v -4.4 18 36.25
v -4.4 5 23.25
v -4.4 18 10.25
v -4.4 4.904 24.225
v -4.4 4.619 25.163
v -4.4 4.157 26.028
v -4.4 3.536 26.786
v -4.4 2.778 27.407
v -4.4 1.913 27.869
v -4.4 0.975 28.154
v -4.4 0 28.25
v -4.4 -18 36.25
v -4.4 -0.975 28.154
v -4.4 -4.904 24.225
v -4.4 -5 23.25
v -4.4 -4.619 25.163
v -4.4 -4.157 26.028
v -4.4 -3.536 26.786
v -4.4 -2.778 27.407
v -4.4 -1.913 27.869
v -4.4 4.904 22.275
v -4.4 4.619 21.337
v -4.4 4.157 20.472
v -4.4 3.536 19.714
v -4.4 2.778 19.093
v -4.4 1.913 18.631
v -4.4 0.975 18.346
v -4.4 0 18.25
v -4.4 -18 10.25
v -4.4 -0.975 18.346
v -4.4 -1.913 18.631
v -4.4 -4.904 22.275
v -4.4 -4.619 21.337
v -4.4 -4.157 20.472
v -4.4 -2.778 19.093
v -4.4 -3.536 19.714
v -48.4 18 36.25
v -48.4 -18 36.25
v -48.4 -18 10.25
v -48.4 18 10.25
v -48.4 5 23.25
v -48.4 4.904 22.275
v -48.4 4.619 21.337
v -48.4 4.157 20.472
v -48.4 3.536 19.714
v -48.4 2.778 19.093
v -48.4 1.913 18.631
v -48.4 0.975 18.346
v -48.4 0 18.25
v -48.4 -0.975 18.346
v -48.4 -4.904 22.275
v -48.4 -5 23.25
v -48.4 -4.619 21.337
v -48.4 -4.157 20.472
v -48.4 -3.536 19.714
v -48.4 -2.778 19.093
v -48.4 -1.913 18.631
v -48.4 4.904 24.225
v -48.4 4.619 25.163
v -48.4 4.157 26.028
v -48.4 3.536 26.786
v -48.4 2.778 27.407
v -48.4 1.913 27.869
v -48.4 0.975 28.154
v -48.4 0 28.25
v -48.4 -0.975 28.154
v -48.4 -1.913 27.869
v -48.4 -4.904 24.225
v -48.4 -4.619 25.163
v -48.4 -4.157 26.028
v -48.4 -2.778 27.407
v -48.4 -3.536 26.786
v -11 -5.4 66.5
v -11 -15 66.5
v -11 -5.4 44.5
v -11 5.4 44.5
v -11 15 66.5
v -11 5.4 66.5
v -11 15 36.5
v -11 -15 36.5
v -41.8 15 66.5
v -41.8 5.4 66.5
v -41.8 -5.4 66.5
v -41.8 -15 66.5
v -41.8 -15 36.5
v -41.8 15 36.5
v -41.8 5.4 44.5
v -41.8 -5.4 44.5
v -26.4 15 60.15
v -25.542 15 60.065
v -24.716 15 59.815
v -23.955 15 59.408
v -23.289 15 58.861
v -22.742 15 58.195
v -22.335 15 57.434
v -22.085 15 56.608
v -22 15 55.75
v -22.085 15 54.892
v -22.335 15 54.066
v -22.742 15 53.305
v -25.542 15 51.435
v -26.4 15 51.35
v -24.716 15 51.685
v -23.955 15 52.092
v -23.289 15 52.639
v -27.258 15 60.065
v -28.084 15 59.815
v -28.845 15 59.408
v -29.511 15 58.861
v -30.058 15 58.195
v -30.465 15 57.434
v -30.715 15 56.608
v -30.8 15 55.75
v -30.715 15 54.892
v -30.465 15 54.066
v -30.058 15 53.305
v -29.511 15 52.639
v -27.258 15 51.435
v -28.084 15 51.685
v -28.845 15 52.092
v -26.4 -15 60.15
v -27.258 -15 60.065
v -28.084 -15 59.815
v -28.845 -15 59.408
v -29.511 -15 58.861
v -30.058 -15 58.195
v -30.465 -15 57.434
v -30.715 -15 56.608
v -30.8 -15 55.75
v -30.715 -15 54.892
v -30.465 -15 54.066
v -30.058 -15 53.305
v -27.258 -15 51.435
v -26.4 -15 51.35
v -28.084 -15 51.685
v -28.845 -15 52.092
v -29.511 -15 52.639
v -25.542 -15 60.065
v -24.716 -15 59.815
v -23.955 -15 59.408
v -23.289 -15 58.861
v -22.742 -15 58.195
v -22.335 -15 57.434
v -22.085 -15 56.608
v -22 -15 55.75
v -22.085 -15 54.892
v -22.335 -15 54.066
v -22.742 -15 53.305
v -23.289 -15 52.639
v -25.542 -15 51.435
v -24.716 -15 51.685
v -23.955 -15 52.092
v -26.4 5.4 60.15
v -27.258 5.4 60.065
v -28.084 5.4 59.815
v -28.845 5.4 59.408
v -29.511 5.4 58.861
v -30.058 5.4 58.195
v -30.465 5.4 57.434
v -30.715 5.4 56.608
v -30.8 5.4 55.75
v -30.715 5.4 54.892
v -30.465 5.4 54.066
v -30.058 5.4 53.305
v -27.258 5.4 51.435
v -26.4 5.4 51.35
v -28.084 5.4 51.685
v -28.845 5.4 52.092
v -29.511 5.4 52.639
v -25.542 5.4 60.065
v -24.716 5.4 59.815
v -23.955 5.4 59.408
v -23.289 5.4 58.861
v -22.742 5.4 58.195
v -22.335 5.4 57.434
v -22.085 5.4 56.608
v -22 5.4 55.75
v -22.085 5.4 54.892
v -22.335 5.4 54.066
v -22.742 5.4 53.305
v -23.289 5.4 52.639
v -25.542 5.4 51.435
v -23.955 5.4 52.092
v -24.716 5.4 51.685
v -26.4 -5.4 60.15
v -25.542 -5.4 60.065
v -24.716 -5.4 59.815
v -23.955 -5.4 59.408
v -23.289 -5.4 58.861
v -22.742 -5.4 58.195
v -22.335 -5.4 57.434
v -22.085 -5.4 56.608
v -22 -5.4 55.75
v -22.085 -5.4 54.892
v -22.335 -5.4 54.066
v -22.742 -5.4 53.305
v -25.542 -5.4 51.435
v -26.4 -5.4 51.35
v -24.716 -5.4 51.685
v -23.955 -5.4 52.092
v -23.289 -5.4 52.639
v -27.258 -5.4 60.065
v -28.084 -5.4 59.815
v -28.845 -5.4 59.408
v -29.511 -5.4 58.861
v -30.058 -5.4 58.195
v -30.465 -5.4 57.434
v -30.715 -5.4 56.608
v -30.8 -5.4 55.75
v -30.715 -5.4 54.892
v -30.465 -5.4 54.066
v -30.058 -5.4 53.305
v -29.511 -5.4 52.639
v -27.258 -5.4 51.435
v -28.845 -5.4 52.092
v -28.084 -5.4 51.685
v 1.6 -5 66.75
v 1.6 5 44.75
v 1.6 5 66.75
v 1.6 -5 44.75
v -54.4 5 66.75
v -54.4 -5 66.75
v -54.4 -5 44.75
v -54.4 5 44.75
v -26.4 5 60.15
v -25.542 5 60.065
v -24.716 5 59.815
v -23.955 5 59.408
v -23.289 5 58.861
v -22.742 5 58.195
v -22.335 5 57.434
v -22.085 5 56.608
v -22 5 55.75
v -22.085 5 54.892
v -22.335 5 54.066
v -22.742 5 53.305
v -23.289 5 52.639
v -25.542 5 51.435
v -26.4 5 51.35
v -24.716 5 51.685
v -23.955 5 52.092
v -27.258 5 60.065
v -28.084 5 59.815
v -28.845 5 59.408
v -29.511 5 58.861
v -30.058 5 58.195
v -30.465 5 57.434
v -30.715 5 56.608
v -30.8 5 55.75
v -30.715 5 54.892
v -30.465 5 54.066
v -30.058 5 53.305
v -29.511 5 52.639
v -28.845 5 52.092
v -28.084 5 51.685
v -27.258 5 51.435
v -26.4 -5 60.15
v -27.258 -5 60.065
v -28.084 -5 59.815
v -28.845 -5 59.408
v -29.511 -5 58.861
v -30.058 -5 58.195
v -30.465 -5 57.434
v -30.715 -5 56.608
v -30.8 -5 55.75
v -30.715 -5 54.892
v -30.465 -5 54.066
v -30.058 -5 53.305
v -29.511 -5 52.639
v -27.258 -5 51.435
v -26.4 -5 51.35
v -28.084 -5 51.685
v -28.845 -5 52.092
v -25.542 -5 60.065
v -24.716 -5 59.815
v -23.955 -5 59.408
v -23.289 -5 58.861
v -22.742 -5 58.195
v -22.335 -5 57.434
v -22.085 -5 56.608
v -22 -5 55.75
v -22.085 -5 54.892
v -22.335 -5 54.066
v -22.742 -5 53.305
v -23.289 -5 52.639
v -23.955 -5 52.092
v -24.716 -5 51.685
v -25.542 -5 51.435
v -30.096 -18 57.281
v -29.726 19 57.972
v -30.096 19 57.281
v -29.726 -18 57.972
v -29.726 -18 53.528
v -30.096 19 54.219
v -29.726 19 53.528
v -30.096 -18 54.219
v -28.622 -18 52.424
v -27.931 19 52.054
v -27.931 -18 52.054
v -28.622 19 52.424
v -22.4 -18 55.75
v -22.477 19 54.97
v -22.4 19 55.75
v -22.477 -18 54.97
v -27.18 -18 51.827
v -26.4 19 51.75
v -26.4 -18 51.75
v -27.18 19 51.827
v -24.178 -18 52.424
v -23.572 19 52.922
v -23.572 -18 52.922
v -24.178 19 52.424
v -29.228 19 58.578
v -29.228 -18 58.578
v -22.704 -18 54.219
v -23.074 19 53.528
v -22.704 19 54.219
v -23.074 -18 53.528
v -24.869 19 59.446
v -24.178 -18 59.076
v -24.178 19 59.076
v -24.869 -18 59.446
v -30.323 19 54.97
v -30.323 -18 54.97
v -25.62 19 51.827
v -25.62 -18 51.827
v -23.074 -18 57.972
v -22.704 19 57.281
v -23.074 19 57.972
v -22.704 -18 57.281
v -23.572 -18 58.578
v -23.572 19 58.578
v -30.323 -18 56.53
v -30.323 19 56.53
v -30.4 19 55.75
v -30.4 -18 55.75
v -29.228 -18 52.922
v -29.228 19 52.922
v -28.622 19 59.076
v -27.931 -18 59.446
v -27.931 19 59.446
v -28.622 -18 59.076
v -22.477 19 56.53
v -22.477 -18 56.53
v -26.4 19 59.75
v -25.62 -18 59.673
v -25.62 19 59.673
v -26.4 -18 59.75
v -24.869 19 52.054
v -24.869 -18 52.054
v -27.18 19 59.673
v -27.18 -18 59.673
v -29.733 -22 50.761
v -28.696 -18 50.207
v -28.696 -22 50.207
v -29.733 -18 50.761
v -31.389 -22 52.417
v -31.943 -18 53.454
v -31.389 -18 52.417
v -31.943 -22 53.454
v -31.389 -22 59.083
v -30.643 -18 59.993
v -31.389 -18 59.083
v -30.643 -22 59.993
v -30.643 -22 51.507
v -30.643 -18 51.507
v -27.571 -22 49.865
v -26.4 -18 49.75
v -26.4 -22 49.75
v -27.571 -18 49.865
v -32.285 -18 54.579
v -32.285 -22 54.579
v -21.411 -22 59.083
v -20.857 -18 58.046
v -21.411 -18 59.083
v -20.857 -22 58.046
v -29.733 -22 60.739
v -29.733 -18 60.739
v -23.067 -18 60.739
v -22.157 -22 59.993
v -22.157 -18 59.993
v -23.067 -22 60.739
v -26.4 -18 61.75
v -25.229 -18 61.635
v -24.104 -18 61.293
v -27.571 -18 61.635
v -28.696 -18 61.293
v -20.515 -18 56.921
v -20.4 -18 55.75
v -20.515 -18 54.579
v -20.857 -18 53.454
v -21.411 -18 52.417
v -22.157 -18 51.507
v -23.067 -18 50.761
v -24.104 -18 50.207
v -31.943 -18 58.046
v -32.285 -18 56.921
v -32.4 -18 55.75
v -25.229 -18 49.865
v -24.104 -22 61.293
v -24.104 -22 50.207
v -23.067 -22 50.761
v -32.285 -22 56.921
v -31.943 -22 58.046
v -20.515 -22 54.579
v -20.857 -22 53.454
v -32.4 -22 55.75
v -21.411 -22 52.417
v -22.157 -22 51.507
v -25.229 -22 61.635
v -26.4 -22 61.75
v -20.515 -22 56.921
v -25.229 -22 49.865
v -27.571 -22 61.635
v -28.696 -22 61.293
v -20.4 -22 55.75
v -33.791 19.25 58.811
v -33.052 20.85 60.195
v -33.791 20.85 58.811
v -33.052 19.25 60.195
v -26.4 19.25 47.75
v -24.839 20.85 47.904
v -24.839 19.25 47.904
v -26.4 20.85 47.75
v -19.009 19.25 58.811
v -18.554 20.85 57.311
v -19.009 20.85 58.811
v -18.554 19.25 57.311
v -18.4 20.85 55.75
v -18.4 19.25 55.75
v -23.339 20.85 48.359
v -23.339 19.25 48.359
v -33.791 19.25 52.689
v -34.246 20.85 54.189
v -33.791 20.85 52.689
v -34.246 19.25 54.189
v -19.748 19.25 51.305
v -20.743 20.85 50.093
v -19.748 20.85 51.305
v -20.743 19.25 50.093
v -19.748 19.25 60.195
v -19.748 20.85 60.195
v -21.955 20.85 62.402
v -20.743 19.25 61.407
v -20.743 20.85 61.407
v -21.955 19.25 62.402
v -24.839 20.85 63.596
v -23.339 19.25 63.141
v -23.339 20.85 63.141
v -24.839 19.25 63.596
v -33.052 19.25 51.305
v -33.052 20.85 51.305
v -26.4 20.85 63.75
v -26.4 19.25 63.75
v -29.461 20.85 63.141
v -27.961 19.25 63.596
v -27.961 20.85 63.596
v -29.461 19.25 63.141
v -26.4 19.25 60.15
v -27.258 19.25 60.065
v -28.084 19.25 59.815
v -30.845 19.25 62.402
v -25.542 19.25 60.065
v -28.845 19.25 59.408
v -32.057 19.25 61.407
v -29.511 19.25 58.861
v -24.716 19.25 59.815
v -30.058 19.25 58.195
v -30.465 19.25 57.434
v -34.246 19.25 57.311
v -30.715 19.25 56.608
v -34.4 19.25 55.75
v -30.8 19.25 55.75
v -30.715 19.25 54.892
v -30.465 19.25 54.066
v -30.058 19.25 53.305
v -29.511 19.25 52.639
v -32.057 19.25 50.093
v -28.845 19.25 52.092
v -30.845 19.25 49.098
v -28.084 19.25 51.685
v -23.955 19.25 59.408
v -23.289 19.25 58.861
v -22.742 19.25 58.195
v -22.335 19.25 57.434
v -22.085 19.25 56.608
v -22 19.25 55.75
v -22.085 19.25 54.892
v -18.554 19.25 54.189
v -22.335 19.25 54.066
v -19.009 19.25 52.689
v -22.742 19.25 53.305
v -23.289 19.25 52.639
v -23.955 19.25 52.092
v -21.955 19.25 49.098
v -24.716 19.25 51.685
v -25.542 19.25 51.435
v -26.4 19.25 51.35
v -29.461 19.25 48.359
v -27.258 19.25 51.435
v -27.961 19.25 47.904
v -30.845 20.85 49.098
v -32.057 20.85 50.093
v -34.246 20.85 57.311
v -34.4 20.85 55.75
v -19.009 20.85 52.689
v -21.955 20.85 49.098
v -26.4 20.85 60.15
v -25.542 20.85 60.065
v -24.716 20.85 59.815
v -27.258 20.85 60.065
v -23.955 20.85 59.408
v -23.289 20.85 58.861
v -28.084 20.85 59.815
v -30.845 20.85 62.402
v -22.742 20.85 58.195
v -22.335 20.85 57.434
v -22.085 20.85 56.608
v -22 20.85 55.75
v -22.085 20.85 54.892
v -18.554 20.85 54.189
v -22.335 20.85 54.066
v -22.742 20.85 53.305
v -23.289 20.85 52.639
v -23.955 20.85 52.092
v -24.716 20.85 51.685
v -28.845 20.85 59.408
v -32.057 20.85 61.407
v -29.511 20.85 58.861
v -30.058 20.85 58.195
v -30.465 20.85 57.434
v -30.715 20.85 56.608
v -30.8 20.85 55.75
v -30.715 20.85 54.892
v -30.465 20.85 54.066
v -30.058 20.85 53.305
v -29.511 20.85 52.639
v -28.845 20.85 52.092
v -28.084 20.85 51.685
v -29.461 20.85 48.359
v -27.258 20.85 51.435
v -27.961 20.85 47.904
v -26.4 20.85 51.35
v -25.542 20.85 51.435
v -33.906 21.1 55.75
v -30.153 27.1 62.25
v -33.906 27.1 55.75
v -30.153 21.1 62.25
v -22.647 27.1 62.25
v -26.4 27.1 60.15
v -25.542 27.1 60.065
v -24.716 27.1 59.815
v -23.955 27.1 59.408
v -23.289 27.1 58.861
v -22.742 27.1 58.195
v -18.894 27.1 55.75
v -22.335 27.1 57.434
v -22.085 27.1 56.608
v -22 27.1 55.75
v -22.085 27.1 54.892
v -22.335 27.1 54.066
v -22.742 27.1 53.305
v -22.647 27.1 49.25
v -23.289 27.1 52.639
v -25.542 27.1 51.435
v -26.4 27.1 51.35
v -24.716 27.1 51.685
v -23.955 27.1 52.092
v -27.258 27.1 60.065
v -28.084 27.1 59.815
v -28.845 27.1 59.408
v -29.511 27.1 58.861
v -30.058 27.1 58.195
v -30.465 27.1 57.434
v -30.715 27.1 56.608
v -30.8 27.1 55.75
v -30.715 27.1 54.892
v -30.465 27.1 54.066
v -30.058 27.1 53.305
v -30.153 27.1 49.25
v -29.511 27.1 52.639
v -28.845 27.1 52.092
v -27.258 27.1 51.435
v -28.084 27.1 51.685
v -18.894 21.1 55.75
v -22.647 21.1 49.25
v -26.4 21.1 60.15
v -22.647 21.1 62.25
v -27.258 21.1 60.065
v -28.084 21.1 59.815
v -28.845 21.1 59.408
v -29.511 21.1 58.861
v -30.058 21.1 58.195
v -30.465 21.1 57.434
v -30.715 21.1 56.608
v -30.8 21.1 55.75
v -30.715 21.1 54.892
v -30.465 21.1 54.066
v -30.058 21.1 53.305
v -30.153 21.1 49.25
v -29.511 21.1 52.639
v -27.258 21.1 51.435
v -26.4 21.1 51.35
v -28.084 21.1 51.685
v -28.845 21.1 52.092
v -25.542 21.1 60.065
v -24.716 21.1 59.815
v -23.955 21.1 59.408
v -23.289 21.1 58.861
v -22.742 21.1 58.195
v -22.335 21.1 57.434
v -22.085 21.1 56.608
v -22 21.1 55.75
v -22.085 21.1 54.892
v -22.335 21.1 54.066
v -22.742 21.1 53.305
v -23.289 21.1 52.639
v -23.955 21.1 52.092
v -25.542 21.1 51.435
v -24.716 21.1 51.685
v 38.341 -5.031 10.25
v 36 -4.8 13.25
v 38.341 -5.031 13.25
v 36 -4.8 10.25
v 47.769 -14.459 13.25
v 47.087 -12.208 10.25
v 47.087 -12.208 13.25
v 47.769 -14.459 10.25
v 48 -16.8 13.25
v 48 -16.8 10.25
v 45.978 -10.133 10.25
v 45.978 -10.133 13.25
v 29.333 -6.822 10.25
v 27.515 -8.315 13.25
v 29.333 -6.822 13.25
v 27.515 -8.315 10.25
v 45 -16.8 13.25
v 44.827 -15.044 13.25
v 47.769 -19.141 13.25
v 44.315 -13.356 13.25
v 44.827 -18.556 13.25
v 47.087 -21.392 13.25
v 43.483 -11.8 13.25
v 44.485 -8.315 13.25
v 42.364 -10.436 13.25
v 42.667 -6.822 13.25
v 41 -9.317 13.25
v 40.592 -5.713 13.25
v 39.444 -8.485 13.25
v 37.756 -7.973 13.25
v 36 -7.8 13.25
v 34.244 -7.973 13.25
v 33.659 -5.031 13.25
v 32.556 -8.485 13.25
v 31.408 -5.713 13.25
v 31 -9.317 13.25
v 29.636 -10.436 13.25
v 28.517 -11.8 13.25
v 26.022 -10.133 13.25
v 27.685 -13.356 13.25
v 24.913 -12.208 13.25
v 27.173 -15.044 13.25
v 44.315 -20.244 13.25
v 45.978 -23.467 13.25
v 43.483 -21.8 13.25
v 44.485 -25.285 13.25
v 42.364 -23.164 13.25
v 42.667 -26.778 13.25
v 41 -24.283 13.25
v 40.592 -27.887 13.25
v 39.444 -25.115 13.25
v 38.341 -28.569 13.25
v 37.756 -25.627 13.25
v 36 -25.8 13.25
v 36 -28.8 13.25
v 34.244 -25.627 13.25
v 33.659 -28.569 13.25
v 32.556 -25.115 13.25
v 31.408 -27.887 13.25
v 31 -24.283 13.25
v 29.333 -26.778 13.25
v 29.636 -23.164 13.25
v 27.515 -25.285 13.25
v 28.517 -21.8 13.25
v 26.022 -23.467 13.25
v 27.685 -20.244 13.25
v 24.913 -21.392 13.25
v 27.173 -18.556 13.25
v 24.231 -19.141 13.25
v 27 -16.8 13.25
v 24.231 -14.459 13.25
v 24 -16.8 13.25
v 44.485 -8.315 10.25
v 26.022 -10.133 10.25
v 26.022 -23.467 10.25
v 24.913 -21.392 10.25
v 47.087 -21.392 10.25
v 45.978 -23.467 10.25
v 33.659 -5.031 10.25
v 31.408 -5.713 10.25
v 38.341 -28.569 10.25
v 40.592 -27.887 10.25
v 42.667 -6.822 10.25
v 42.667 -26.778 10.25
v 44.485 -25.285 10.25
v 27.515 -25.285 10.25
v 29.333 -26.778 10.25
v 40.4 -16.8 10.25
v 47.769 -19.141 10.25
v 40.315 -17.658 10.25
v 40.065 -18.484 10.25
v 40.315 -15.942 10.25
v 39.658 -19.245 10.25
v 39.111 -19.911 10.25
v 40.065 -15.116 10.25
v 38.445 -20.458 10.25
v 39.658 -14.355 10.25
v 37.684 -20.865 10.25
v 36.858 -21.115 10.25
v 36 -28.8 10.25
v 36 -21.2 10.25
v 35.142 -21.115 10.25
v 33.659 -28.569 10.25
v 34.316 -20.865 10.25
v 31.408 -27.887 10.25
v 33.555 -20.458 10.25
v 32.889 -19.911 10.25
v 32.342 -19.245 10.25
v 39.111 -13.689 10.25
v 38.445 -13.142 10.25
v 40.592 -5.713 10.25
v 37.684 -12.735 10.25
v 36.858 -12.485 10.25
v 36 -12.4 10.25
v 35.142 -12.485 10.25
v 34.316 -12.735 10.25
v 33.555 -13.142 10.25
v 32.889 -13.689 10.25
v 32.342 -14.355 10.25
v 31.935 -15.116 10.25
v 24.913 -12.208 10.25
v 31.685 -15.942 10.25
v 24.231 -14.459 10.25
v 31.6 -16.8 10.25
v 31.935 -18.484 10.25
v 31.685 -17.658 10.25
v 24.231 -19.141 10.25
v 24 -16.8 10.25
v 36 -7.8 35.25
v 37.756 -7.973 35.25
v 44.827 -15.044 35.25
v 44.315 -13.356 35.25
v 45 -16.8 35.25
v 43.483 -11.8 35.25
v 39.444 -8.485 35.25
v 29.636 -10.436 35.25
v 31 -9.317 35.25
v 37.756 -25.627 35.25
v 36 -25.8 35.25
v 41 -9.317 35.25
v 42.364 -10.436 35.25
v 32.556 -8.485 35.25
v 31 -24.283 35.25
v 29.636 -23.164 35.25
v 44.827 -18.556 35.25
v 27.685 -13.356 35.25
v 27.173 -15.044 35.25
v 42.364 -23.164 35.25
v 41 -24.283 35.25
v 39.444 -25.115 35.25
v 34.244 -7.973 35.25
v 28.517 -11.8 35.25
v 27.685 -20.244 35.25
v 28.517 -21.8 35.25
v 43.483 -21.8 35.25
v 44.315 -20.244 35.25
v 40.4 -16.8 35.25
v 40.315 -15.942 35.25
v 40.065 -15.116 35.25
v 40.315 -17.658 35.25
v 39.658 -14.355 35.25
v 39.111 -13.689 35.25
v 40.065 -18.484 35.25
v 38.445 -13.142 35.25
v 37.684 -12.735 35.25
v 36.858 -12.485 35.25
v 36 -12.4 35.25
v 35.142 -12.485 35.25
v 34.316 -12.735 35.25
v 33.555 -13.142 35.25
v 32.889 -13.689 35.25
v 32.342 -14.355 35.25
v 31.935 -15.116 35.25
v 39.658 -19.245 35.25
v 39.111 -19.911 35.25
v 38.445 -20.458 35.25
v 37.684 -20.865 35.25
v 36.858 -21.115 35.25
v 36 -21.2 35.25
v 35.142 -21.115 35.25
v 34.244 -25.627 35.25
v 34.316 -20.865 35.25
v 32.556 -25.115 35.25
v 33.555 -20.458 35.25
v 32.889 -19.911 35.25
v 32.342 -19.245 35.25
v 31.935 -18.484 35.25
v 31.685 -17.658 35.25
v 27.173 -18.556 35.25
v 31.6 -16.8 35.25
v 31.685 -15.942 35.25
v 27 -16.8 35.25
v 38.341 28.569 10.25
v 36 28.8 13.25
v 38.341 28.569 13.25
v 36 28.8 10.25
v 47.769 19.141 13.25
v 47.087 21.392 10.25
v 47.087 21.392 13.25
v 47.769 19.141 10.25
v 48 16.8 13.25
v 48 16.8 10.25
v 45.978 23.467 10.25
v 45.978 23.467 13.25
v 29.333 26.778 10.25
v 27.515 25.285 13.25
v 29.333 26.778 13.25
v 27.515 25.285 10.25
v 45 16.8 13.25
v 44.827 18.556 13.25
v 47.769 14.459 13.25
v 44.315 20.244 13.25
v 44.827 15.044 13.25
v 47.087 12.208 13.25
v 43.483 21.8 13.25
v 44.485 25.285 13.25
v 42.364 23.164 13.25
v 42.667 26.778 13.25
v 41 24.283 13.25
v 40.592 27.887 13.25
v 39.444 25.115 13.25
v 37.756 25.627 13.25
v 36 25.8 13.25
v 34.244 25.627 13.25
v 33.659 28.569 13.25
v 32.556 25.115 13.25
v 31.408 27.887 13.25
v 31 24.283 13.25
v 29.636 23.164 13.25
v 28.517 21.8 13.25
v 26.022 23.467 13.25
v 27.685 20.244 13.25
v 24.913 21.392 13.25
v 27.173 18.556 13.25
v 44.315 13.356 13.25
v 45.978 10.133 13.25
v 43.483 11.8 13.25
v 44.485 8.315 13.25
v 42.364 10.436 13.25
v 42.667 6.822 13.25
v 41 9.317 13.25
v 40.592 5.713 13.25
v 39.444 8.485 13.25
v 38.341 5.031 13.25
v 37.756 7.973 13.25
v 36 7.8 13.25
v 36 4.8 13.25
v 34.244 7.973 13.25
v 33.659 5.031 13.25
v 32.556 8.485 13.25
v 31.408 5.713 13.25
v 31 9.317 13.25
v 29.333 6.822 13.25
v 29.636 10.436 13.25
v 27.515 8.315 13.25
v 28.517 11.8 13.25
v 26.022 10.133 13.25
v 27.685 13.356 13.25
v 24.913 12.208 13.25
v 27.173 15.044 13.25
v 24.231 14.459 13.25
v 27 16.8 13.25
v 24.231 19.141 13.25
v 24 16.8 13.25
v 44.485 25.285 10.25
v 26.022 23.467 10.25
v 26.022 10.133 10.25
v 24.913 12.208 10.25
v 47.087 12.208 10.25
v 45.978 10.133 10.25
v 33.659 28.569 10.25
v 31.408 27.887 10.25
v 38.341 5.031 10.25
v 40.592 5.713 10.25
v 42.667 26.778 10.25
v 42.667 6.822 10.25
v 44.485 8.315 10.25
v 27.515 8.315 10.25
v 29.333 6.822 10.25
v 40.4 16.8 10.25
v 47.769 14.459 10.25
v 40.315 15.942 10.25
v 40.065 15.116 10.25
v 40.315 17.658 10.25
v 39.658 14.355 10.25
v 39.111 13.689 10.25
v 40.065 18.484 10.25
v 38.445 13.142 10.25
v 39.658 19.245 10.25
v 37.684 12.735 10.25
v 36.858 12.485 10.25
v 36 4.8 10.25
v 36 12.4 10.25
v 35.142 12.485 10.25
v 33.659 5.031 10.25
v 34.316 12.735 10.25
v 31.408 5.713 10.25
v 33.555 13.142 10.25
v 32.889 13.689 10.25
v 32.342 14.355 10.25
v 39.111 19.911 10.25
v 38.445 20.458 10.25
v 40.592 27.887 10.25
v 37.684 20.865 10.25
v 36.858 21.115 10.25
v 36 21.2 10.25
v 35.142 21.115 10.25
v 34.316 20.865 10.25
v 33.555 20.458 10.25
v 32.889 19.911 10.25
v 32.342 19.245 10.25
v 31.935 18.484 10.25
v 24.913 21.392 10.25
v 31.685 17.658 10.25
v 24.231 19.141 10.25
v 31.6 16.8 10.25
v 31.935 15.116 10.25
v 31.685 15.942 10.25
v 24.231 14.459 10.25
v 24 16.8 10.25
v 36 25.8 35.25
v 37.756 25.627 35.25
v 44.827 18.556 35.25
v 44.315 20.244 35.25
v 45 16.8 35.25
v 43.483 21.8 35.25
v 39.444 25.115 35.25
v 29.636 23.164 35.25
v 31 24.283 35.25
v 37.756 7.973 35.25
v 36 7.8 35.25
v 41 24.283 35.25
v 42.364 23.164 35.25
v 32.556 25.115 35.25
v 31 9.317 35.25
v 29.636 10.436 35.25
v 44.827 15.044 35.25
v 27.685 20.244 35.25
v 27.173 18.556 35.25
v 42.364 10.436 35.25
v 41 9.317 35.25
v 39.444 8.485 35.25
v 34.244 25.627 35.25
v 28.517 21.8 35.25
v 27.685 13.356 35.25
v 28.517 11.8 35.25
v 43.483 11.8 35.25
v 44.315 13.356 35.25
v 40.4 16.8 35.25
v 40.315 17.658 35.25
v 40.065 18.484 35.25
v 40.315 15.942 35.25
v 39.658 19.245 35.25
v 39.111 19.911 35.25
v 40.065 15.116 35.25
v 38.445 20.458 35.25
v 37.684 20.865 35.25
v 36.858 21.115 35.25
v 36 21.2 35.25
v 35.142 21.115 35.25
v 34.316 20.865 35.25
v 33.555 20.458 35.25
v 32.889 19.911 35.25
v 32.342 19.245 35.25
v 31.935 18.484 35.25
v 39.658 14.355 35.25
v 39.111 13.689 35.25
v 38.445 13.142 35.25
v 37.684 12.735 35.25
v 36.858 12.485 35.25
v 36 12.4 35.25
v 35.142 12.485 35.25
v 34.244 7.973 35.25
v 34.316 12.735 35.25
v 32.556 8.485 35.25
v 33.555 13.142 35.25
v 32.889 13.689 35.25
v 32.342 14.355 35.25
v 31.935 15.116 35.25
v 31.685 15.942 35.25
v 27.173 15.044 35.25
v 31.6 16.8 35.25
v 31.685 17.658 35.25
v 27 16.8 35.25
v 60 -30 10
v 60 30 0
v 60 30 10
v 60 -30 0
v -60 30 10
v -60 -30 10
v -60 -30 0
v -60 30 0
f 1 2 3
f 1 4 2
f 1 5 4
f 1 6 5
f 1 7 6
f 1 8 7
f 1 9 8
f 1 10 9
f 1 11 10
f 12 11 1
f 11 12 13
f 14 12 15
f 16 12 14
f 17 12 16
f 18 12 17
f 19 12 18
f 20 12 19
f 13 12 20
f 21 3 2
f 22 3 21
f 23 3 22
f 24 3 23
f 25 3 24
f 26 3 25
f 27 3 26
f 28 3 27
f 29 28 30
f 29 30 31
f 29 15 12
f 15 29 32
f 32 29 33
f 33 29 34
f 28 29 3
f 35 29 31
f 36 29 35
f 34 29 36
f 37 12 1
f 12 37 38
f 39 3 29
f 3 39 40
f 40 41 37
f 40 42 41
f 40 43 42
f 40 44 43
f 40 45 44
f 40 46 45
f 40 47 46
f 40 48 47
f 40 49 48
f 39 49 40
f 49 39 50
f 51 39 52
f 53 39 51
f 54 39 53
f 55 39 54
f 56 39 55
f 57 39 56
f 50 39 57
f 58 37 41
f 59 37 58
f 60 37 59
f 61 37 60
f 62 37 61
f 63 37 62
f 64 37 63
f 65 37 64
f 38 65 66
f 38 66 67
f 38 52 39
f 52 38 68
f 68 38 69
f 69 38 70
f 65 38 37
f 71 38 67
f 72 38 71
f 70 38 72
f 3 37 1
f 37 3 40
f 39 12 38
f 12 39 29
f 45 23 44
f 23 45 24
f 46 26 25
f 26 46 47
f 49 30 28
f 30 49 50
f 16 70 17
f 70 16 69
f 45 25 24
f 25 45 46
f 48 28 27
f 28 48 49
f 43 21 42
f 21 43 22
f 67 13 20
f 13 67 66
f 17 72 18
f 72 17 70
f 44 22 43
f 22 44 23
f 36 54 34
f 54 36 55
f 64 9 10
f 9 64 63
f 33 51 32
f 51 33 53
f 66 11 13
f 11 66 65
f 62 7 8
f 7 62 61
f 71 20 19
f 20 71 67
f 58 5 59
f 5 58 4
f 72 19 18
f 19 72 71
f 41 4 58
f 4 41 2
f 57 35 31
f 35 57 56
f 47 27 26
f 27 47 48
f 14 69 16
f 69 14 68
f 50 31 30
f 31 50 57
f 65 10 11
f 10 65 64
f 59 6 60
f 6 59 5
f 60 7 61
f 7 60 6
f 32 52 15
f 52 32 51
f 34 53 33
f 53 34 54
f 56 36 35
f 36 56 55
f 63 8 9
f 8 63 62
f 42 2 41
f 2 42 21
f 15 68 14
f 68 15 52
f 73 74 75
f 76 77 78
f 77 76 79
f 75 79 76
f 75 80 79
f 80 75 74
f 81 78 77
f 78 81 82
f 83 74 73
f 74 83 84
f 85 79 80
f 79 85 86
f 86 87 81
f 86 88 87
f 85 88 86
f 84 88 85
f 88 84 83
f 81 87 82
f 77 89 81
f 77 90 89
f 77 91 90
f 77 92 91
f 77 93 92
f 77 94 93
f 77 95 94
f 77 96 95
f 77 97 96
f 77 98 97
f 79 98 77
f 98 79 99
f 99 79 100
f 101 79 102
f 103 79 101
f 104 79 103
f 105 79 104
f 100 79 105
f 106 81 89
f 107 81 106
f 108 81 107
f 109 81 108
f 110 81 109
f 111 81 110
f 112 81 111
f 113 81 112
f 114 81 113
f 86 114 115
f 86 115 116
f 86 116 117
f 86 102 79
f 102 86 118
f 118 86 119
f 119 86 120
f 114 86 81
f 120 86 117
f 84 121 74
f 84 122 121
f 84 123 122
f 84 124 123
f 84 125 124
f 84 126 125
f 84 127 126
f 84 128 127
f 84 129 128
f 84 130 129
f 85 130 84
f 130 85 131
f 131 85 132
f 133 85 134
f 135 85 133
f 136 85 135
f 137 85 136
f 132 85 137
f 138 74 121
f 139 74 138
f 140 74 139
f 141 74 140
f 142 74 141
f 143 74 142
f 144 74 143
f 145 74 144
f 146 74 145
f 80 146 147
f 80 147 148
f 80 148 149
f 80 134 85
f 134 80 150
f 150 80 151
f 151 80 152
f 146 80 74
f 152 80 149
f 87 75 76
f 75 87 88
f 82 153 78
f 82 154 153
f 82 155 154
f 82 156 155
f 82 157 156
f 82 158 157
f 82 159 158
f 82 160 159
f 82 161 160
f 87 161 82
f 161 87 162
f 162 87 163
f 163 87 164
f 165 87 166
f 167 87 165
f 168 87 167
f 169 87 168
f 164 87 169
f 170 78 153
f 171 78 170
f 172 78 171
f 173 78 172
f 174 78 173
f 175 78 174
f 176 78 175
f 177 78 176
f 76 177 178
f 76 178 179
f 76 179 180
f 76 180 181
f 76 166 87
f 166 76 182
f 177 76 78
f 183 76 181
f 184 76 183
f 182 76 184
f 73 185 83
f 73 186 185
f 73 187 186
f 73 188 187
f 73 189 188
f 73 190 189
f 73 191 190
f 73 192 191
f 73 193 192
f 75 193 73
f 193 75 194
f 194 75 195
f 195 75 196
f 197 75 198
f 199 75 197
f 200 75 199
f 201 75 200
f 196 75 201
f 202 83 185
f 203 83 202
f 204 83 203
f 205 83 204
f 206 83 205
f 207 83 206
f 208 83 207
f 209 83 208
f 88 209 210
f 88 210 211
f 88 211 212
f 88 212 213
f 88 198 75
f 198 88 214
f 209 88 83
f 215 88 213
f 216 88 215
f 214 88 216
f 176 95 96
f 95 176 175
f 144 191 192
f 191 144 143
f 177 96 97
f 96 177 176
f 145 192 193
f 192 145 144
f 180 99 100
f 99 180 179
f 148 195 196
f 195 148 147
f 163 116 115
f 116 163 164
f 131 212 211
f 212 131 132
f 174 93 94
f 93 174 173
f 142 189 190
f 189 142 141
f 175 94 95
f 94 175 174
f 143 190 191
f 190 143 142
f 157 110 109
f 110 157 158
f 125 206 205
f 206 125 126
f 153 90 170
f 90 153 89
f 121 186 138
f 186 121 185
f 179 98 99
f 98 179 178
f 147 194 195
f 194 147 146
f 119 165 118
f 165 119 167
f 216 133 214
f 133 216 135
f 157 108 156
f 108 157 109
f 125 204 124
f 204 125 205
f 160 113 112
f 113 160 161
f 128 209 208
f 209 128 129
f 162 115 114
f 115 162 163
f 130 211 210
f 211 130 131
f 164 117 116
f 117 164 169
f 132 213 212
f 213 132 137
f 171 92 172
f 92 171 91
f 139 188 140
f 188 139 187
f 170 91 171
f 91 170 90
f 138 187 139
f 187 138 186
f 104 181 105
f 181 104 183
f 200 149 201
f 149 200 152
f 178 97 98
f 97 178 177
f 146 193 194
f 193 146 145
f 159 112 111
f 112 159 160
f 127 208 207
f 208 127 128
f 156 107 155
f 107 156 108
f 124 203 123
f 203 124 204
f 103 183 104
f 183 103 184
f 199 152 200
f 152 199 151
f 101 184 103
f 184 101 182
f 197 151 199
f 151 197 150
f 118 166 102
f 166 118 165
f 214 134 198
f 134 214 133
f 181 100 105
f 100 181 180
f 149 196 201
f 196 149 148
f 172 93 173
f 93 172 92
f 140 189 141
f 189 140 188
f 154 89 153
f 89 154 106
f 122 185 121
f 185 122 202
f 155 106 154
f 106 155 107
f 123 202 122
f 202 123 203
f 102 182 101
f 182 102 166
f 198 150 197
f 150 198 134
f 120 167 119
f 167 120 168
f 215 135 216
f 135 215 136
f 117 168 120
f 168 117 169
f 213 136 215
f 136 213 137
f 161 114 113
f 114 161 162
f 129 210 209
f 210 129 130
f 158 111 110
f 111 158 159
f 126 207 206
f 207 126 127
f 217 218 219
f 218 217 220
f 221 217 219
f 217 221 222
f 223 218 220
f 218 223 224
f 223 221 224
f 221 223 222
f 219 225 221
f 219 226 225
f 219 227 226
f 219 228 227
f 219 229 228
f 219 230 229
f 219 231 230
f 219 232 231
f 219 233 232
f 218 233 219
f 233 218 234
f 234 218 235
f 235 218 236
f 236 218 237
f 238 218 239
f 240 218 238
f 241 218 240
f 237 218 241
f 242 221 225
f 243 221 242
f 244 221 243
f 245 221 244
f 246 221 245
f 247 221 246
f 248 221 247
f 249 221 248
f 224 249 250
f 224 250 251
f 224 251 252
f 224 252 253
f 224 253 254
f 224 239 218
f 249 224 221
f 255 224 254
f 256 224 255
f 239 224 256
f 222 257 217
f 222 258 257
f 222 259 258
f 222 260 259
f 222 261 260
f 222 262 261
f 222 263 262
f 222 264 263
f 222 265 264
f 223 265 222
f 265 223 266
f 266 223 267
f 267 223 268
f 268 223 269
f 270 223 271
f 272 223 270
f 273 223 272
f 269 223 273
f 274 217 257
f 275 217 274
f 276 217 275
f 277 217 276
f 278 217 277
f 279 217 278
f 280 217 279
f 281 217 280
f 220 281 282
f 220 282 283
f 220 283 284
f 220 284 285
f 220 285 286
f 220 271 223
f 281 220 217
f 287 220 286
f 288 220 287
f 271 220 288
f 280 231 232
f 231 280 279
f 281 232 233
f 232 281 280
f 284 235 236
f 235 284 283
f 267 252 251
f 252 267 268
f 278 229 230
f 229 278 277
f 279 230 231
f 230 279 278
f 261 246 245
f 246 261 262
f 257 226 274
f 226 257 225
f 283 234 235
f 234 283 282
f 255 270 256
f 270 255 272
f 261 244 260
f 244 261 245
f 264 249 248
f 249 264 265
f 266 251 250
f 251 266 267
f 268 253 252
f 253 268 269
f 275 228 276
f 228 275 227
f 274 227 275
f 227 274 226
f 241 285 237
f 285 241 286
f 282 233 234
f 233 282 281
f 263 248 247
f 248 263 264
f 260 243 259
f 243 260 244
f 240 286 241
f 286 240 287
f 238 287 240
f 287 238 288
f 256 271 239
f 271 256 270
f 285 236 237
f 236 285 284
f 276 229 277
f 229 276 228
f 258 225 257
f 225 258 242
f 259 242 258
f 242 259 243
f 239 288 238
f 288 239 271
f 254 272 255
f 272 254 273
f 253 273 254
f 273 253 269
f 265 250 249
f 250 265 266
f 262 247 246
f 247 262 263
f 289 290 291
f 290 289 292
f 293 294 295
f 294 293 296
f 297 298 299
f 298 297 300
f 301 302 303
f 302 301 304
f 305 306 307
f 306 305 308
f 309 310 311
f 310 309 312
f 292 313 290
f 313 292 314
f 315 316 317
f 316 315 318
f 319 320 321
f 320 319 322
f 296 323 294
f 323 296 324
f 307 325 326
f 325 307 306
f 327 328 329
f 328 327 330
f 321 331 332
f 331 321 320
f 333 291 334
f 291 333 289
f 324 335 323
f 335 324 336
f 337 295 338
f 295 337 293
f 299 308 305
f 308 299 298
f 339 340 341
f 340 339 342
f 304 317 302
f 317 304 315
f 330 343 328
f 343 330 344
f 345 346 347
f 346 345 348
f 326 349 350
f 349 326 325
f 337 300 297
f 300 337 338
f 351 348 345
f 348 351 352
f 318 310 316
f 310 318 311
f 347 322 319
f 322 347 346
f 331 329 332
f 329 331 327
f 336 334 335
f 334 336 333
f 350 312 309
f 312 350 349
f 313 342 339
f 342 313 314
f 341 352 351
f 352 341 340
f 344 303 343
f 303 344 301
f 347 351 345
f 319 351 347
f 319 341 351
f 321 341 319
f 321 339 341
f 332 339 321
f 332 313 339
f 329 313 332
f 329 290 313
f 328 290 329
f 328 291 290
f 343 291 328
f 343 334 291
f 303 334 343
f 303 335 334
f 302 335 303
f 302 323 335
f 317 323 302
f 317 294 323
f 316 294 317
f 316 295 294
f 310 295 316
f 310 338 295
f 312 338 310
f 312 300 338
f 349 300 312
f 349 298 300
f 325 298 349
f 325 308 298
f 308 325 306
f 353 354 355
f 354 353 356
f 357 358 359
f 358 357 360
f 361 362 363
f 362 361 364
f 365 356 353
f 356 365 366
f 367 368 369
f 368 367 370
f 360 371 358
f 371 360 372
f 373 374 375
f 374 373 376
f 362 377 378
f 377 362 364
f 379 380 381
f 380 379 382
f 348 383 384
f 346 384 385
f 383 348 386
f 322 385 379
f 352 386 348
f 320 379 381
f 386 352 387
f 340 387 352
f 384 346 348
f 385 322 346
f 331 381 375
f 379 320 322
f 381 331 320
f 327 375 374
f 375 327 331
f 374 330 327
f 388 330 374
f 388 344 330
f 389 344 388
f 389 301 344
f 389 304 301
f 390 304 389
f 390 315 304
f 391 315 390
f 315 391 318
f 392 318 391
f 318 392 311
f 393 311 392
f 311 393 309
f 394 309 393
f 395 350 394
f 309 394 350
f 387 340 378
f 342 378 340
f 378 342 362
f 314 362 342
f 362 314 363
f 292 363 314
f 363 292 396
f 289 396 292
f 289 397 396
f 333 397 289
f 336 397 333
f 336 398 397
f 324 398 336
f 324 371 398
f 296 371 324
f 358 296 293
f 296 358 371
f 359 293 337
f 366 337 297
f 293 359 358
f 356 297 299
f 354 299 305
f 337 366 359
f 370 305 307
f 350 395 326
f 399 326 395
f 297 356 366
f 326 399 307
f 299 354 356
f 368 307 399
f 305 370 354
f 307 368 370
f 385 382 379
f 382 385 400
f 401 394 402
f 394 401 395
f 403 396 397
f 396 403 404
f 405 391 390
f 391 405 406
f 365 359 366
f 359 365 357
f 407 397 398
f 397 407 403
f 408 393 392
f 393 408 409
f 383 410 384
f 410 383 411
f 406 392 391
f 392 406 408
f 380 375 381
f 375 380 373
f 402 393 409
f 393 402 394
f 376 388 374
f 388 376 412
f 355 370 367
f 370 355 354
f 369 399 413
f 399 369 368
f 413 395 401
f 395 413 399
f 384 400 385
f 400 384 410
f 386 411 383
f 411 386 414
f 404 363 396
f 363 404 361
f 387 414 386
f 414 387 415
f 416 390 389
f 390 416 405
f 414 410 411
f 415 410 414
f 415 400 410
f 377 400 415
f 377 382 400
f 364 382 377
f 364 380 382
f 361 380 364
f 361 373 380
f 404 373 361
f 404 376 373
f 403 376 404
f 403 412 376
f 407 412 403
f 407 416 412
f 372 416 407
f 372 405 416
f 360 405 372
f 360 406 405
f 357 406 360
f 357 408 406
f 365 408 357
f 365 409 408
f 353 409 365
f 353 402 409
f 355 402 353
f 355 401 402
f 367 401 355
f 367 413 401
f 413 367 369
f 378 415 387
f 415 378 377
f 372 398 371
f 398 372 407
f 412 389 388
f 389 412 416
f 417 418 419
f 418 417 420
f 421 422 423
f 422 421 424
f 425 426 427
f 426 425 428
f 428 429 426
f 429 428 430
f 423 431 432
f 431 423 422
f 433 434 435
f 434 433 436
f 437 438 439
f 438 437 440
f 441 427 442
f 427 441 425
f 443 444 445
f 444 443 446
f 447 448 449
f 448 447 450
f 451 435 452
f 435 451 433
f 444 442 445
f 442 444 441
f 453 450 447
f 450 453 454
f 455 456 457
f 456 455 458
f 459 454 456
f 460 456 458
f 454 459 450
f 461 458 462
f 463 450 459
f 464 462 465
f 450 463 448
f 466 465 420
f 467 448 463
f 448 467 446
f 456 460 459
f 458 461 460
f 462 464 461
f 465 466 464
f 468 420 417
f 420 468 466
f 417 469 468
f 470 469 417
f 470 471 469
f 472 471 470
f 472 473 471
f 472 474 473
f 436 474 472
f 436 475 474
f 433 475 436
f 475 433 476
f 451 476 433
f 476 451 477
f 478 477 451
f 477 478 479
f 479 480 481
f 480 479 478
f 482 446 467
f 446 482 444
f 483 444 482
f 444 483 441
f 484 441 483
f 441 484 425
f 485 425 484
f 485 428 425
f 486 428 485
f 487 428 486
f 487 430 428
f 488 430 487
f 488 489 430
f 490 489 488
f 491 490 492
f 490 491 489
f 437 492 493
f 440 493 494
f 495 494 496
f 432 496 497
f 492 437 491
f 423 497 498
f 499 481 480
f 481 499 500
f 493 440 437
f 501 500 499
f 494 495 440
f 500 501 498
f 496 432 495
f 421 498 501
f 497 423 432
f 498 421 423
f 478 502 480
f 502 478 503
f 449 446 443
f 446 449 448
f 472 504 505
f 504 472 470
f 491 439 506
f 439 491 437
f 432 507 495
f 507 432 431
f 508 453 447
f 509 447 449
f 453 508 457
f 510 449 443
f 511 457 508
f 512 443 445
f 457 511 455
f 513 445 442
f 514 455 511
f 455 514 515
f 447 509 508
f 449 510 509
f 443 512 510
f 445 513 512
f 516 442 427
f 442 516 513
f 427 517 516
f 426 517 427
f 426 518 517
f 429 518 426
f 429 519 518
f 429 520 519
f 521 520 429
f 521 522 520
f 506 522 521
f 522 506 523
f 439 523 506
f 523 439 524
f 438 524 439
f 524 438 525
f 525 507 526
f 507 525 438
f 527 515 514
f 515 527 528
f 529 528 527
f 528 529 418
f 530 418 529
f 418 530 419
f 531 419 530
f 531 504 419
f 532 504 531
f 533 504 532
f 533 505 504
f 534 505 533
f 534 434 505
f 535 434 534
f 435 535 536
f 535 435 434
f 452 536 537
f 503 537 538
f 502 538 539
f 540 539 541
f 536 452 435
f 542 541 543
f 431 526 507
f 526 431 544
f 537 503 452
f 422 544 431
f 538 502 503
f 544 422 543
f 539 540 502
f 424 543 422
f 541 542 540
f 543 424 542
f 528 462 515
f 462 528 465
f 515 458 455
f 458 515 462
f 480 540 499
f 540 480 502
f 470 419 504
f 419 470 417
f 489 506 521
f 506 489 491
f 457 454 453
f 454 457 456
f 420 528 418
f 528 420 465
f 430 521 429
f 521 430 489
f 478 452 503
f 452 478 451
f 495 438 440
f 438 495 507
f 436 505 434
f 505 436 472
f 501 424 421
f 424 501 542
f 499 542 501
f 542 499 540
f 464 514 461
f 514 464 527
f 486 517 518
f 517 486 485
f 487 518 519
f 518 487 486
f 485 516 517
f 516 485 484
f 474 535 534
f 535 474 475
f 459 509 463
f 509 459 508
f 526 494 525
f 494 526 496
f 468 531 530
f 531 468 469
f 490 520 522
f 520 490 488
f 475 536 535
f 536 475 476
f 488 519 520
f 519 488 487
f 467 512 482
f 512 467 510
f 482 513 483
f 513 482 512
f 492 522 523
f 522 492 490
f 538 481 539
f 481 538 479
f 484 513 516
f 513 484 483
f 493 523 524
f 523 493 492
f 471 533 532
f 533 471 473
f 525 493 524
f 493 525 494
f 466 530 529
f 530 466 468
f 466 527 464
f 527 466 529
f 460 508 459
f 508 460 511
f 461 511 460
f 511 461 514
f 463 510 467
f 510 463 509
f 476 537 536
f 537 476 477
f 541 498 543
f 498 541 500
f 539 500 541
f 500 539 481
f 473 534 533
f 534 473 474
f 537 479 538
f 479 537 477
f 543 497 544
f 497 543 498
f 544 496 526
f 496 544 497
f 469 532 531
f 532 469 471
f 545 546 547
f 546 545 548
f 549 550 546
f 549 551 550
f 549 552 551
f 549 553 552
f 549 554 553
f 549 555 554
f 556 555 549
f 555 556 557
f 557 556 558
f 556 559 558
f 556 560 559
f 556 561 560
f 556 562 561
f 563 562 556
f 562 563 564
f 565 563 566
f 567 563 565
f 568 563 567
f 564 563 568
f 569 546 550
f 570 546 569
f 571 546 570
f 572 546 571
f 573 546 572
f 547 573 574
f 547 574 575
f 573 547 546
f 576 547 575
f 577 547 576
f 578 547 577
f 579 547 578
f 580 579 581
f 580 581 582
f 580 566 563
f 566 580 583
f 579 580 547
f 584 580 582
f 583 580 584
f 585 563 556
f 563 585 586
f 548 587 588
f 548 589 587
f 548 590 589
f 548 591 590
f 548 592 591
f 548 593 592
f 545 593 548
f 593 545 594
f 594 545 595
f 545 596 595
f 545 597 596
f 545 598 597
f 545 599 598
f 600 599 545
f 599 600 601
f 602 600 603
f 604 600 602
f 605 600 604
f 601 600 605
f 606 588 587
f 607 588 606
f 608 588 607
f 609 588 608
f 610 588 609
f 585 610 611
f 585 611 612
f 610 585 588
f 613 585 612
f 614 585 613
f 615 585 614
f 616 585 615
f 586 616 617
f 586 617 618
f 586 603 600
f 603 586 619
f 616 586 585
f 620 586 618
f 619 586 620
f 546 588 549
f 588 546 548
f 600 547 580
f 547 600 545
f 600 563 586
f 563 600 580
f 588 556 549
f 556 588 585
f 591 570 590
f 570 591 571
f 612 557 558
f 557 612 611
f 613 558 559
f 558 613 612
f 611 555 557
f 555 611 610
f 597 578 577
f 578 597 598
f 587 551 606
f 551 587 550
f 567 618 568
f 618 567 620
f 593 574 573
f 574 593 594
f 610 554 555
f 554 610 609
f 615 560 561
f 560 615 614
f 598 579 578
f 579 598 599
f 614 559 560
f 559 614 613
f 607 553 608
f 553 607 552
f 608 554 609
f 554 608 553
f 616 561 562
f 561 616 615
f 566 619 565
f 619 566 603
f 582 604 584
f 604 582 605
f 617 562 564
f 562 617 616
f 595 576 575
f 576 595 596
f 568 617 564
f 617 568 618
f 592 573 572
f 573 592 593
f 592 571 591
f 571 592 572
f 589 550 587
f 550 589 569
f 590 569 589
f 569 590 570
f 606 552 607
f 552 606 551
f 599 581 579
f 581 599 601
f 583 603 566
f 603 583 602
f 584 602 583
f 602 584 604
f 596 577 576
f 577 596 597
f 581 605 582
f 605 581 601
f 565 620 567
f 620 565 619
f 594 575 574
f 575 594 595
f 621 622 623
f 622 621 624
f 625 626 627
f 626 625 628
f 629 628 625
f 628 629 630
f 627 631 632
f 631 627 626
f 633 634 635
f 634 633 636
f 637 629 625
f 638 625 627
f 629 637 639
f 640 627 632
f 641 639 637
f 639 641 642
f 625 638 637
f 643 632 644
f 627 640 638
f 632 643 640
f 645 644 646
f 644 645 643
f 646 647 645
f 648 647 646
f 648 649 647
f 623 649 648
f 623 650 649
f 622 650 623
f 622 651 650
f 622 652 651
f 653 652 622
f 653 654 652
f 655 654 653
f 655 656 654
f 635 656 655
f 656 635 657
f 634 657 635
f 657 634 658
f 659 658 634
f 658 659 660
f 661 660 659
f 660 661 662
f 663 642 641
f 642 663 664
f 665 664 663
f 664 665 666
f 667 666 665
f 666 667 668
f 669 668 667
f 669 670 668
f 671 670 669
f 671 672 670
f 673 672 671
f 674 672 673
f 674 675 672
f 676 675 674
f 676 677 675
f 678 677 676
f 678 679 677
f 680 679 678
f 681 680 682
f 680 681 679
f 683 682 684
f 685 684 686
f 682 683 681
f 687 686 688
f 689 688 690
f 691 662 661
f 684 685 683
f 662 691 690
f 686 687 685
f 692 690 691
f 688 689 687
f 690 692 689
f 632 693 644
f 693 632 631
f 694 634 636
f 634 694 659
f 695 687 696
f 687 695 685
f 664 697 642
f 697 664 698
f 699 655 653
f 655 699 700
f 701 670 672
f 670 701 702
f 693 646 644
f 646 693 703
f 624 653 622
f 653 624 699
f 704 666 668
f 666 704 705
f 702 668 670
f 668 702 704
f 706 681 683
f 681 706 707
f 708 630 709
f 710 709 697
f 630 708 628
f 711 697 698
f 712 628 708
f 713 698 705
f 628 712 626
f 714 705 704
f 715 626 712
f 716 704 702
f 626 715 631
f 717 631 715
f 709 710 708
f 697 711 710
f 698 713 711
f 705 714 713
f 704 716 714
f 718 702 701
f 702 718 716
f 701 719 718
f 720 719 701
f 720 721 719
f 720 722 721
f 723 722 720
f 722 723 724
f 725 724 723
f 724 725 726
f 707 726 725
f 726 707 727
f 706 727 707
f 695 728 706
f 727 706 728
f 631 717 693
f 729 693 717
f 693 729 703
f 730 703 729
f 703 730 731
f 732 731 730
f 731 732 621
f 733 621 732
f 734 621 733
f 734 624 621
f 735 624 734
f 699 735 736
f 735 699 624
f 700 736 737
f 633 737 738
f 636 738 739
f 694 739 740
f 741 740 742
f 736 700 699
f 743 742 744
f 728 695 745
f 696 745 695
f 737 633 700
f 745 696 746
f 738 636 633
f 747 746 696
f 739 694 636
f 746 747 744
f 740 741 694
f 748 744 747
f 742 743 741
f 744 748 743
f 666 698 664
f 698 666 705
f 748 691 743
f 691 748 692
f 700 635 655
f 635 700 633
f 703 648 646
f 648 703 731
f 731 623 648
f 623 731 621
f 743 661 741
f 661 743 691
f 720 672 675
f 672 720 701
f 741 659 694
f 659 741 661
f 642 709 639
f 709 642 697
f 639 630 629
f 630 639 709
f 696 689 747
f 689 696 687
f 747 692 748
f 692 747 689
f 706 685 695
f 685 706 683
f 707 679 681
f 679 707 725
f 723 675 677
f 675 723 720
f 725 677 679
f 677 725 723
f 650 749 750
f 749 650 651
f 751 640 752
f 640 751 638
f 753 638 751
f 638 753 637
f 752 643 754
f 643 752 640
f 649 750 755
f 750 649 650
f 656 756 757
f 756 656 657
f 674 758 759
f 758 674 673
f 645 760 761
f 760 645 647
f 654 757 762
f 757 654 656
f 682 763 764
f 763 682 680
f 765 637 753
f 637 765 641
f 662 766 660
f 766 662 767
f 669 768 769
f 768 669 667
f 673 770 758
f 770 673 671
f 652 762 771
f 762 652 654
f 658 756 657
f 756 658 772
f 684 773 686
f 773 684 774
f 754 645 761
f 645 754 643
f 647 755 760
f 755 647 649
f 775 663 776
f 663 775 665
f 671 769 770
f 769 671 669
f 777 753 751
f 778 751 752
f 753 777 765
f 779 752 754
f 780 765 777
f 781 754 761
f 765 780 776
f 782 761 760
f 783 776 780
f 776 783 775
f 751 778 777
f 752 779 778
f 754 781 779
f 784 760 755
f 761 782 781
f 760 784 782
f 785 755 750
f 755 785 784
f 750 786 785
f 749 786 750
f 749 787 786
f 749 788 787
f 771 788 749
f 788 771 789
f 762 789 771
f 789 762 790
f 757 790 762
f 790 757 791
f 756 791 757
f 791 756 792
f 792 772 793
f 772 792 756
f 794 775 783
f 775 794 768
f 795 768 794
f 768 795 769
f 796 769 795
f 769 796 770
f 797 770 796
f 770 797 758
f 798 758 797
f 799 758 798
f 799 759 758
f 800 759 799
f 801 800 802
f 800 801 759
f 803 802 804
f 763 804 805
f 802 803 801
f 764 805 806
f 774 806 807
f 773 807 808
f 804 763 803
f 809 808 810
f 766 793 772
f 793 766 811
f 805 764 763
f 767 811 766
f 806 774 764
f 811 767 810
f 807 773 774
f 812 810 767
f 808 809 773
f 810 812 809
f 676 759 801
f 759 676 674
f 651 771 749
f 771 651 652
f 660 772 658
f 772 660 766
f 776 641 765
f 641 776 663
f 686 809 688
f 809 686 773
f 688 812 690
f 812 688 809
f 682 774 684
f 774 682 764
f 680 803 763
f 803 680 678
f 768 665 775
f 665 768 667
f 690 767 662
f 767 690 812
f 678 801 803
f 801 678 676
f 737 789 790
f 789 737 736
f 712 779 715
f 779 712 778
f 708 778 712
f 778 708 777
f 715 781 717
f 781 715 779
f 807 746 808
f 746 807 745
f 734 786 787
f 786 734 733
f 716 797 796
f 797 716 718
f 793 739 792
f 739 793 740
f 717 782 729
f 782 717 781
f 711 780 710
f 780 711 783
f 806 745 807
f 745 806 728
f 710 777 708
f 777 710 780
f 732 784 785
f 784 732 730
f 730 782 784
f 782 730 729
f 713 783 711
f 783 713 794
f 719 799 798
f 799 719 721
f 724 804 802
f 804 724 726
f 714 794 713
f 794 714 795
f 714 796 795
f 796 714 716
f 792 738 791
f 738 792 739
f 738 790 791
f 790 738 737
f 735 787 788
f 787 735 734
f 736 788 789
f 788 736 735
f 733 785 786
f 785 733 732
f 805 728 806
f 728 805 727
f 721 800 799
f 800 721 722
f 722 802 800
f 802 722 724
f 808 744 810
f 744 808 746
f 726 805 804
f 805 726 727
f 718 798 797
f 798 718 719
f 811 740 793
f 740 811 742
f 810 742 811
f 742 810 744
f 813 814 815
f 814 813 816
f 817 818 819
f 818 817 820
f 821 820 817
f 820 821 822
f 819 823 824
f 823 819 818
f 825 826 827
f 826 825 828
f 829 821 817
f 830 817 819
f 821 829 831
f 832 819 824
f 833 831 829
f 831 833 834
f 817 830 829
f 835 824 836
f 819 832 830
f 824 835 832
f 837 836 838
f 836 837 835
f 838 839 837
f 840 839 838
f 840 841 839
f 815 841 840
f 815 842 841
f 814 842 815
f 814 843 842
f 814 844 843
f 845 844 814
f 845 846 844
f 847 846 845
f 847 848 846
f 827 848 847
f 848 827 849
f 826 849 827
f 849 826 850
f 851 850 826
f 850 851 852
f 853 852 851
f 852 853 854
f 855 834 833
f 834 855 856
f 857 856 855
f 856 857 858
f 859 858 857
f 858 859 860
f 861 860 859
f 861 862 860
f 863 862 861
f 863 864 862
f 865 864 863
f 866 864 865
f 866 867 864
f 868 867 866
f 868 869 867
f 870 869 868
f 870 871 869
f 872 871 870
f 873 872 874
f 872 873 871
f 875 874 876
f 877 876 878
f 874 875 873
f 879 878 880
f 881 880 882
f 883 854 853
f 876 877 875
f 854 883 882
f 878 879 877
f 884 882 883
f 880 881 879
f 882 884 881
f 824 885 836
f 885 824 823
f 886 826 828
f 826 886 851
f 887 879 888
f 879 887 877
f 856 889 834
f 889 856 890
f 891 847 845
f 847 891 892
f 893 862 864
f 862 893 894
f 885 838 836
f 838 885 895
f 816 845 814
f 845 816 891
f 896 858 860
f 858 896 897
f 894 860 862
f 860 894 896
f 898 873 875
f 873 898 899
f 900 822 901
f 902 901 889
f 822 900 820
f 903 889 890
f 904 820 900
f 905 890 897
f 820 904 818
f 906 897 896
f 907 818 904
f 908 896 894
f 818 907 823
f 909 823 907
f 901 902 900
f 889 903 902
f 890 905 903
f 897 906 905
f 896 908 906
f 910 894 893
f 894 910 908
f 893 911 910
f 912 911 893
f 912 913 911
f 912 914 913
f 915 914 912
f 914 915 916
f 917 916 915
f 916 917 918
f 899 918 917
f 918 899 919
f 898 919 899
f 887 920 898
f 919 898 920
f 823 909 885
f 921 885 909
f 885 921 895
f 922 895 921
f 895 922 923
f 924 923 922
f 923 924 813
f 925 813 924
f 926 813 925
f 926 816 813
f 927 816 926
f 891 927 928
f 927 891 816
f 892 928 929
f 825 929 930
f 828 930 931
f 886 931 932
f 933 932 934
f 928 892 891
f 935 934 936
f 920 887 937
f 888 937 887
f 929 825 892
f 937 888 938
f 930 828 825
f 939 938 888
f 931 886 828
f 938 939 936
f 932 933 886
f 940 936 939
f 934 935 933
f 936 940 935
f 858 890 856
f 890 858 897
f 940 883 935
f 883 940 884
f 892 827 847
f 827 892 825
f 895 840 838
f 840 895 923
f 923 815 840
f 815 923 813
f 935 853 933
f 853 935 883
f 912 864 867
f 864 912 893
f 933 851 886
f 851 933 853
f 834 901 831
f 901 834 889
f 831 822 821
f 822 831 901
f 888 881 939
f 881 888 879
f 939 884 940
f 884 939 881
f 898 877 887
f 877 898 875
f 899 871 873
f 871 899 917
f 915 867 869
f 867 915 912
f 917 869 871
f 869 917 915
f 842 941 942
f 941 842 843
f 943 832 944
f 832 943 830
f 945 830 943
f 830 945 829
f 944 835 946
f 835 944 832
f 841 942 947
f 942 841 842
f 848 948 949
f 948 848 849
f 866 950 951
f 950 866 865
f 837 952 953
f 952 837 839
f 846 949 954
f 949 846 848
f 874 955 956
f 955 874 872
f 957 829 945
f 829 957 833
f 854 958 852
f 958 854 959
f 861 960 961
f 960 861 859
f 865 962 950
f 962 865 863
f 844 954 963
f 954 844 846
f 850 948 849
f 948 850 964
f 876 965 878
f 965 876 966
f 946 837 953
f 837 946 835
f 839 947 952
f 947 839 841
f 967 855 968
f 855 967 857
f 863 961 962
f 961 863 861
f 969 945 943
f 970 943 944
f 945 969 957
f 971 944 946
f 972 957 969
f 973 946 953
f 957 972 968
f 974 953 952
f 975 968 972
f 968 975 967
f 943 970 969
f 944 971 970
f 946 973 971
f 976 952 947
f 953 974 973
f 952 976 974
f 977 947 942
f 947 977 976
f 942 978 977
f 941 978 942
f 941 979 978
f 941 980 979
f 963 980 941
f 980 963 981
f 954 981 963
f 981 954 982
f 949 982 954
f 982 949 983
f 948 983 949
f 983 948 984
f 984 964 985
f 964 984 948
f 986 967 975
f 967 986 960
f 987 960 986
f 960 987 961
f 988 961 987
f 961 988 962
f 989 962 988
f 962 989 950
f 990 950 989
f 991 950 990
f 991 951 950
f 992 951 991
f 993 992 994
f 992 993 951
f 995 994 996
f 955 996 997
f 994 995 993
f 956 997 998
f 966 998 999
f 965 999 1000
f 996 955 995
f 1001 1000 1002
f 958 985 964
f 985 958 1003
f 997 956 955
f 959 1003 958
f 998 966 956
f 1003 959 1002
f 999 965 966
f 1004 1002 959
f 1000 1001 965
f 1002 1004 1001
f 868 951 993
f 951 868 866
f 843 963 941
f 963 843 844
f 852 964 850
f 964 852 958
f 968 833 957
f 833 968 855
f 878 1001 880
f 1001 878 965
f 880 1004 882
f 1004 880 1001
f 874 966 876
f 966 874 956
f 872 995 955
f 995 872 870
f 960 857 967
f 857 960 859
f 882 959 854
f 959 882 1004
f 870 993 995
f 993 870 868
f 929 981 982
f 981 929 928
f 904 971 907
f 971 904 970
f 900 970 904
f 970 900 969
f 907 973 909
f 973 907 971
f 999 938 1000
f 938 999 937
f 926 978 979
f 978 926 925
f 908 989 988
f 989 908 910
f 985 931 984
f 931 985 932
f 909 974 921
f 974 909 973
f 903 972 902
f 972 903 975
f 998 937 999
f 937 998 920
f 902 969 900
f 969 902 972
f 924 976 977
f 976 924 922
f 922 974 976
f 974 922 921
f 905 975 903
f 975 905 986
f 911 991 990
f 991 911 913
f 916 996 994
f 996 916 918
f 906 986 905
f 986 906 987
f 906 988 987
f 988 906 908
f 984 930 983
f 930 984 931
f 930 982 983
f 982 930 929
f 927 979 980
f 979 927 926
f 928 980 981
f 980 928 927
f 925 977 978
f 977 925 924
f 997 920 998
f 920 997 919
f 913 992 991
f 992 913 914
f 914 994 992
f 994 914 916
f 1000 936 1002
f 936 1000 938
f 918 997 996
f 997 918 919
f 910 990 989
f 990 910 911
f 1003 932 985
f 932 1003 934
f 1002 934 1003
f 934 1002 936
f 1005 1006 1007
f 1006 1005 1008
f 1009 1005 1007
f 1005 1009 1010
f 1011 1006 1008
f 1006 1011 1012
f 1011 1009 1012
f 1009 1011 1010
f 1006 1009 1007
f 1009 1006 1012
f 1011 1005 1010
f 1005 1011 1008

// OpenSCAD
$fn = 32;

// ------------------------------------------------------------------------
// Indexing jig: plate 120 x 60 mm, pin d8
// Every part is its own module, assembly() places every instance.
// ------------------------------------------------------------------------

// --- part 1 ---
module jig_plate() {
  difference() {
    translate([-60, -30, 0]) cube([120, 60, 10]);
  }
}

// --- part 2 ---
module locator_block() {
  difference() {
    translate([-22, -18, 0]) cube([44, 36, 26]);
    translate([0, 0, 13]) rotate([0, 90, 0]) cylinder(h = 46, d = 10, center = true);
  }
}

// --- part 3 ---
module index_fork() {
  difference() {
    translate([-15.4, -15, 0]) cube([30.8, 30, 30]);
    translate([-16.4, -5.4, 8]) cube([32.8, 10.8, 23]);
    translate([0, 0, 19.25]) rotate([90, 0, 0]) cylinder(h = 32, d = 8.8, center = true);
  }
}

// --- part 4 ---
module index_arm() {
  difference() {
    translate([-28, -5, 0]) cube([56, 10, 22]);
    translate([0, 0, 11]) rotate([90, 0, 0]) cylinder(h = 12, d = 8.8, center = true);
  }
}

// --- part 5 ---
module index_pin() {
  rotate([0, 90, 0]) cylinder(h = 38, d = 8, center = true);
  translate([-22, 0, 0]) rotate([0, 90, 0]) cylinder(h = 4, d = 12);
}

// --- part 6 ---
module pin_washer() {
  difference() {
      translate([0, 0, 0]) cylinder(h = 1.6, d = 16);
      translate([0, 0, -1]) cylinder(h = 3.6, d = 8.8);
    }
}

// --- part 7 ---
module lock_nut() {
  difference() {
    linear_extrude(height = 6) polygon(points = [[7.506, 0], [3.753, 6.5], [-3.753, 6.5], [-7.506, 0], [-3.753, -6.5], [3.753, -6.5]]);
    translate([0, 0, -1]) cylinder(h = 8, d = 8.8);
  }
}

// --- part 8 ---
module guide_bush_a() {
  difference() {
    union() {
      cylinder(h = 3, d = 24);
      translate([0, 0, 3]) cylinder(h = 22, d = 18);
    }
    translate([0, 0, -1]) cylinder(h = 27, d = 8.8);
  }
}

// --- part 9 ---
module guide_bush_b() {
  difference() {
    union() {
      cylinder(h = 3, d = 24);
      translate([0, 0, 3]) cylinder(h = 22, d = 18);
    }
    translate([0, 0, -1]) cylinder(h = 27, d = 8.8);
  }
}

// --- assembly ---
module assembly() {
  color([0.80, 0.24, 0.20]) translate([0, 0, 0]) rotate([0, 0, 0]) jig_plate();
  color([0.20, 0.45, 0.75]) translate([-26.4, 0, 10.25]) rotate([0, 0, 0]) locator_block();
  color([0.25, 0.62, 0.32]) translate([-26.4, 0, 36.5]) rotate([0, 0, 0]) index_fork();
  color([0.92, 0.70, 0.18]) translate([-26.4, 0, 44.75]) rotate([0, 0, 0]) index_arm();
  color([0.58, 0.35, 0.70]) translate([-26.4, 0, 55.75]) rotate([0, 0, 90]) index_pin();
  color([0.16, 0.66, 0.66]) translate([-26.4, 20.85, 55.75]) rotate([90, 0, 0]) pin_washer();
  color([0.85, 0.48, 0.18]) translate([-26.4, 27.1, 55.75]) rotate([90, 0, 0]) lock_nut();
  color([0.55, 0.60, 0.65]) translate([36, -16.8, 10.25]) rotate([0, 0, 0]) guide_bush_a();
  color([0.75, 0.30, 0.55]) translate([36, 16.8, 10.25]) rotate([0, 0, 0]) guide_bush_b();
}

assembly();
